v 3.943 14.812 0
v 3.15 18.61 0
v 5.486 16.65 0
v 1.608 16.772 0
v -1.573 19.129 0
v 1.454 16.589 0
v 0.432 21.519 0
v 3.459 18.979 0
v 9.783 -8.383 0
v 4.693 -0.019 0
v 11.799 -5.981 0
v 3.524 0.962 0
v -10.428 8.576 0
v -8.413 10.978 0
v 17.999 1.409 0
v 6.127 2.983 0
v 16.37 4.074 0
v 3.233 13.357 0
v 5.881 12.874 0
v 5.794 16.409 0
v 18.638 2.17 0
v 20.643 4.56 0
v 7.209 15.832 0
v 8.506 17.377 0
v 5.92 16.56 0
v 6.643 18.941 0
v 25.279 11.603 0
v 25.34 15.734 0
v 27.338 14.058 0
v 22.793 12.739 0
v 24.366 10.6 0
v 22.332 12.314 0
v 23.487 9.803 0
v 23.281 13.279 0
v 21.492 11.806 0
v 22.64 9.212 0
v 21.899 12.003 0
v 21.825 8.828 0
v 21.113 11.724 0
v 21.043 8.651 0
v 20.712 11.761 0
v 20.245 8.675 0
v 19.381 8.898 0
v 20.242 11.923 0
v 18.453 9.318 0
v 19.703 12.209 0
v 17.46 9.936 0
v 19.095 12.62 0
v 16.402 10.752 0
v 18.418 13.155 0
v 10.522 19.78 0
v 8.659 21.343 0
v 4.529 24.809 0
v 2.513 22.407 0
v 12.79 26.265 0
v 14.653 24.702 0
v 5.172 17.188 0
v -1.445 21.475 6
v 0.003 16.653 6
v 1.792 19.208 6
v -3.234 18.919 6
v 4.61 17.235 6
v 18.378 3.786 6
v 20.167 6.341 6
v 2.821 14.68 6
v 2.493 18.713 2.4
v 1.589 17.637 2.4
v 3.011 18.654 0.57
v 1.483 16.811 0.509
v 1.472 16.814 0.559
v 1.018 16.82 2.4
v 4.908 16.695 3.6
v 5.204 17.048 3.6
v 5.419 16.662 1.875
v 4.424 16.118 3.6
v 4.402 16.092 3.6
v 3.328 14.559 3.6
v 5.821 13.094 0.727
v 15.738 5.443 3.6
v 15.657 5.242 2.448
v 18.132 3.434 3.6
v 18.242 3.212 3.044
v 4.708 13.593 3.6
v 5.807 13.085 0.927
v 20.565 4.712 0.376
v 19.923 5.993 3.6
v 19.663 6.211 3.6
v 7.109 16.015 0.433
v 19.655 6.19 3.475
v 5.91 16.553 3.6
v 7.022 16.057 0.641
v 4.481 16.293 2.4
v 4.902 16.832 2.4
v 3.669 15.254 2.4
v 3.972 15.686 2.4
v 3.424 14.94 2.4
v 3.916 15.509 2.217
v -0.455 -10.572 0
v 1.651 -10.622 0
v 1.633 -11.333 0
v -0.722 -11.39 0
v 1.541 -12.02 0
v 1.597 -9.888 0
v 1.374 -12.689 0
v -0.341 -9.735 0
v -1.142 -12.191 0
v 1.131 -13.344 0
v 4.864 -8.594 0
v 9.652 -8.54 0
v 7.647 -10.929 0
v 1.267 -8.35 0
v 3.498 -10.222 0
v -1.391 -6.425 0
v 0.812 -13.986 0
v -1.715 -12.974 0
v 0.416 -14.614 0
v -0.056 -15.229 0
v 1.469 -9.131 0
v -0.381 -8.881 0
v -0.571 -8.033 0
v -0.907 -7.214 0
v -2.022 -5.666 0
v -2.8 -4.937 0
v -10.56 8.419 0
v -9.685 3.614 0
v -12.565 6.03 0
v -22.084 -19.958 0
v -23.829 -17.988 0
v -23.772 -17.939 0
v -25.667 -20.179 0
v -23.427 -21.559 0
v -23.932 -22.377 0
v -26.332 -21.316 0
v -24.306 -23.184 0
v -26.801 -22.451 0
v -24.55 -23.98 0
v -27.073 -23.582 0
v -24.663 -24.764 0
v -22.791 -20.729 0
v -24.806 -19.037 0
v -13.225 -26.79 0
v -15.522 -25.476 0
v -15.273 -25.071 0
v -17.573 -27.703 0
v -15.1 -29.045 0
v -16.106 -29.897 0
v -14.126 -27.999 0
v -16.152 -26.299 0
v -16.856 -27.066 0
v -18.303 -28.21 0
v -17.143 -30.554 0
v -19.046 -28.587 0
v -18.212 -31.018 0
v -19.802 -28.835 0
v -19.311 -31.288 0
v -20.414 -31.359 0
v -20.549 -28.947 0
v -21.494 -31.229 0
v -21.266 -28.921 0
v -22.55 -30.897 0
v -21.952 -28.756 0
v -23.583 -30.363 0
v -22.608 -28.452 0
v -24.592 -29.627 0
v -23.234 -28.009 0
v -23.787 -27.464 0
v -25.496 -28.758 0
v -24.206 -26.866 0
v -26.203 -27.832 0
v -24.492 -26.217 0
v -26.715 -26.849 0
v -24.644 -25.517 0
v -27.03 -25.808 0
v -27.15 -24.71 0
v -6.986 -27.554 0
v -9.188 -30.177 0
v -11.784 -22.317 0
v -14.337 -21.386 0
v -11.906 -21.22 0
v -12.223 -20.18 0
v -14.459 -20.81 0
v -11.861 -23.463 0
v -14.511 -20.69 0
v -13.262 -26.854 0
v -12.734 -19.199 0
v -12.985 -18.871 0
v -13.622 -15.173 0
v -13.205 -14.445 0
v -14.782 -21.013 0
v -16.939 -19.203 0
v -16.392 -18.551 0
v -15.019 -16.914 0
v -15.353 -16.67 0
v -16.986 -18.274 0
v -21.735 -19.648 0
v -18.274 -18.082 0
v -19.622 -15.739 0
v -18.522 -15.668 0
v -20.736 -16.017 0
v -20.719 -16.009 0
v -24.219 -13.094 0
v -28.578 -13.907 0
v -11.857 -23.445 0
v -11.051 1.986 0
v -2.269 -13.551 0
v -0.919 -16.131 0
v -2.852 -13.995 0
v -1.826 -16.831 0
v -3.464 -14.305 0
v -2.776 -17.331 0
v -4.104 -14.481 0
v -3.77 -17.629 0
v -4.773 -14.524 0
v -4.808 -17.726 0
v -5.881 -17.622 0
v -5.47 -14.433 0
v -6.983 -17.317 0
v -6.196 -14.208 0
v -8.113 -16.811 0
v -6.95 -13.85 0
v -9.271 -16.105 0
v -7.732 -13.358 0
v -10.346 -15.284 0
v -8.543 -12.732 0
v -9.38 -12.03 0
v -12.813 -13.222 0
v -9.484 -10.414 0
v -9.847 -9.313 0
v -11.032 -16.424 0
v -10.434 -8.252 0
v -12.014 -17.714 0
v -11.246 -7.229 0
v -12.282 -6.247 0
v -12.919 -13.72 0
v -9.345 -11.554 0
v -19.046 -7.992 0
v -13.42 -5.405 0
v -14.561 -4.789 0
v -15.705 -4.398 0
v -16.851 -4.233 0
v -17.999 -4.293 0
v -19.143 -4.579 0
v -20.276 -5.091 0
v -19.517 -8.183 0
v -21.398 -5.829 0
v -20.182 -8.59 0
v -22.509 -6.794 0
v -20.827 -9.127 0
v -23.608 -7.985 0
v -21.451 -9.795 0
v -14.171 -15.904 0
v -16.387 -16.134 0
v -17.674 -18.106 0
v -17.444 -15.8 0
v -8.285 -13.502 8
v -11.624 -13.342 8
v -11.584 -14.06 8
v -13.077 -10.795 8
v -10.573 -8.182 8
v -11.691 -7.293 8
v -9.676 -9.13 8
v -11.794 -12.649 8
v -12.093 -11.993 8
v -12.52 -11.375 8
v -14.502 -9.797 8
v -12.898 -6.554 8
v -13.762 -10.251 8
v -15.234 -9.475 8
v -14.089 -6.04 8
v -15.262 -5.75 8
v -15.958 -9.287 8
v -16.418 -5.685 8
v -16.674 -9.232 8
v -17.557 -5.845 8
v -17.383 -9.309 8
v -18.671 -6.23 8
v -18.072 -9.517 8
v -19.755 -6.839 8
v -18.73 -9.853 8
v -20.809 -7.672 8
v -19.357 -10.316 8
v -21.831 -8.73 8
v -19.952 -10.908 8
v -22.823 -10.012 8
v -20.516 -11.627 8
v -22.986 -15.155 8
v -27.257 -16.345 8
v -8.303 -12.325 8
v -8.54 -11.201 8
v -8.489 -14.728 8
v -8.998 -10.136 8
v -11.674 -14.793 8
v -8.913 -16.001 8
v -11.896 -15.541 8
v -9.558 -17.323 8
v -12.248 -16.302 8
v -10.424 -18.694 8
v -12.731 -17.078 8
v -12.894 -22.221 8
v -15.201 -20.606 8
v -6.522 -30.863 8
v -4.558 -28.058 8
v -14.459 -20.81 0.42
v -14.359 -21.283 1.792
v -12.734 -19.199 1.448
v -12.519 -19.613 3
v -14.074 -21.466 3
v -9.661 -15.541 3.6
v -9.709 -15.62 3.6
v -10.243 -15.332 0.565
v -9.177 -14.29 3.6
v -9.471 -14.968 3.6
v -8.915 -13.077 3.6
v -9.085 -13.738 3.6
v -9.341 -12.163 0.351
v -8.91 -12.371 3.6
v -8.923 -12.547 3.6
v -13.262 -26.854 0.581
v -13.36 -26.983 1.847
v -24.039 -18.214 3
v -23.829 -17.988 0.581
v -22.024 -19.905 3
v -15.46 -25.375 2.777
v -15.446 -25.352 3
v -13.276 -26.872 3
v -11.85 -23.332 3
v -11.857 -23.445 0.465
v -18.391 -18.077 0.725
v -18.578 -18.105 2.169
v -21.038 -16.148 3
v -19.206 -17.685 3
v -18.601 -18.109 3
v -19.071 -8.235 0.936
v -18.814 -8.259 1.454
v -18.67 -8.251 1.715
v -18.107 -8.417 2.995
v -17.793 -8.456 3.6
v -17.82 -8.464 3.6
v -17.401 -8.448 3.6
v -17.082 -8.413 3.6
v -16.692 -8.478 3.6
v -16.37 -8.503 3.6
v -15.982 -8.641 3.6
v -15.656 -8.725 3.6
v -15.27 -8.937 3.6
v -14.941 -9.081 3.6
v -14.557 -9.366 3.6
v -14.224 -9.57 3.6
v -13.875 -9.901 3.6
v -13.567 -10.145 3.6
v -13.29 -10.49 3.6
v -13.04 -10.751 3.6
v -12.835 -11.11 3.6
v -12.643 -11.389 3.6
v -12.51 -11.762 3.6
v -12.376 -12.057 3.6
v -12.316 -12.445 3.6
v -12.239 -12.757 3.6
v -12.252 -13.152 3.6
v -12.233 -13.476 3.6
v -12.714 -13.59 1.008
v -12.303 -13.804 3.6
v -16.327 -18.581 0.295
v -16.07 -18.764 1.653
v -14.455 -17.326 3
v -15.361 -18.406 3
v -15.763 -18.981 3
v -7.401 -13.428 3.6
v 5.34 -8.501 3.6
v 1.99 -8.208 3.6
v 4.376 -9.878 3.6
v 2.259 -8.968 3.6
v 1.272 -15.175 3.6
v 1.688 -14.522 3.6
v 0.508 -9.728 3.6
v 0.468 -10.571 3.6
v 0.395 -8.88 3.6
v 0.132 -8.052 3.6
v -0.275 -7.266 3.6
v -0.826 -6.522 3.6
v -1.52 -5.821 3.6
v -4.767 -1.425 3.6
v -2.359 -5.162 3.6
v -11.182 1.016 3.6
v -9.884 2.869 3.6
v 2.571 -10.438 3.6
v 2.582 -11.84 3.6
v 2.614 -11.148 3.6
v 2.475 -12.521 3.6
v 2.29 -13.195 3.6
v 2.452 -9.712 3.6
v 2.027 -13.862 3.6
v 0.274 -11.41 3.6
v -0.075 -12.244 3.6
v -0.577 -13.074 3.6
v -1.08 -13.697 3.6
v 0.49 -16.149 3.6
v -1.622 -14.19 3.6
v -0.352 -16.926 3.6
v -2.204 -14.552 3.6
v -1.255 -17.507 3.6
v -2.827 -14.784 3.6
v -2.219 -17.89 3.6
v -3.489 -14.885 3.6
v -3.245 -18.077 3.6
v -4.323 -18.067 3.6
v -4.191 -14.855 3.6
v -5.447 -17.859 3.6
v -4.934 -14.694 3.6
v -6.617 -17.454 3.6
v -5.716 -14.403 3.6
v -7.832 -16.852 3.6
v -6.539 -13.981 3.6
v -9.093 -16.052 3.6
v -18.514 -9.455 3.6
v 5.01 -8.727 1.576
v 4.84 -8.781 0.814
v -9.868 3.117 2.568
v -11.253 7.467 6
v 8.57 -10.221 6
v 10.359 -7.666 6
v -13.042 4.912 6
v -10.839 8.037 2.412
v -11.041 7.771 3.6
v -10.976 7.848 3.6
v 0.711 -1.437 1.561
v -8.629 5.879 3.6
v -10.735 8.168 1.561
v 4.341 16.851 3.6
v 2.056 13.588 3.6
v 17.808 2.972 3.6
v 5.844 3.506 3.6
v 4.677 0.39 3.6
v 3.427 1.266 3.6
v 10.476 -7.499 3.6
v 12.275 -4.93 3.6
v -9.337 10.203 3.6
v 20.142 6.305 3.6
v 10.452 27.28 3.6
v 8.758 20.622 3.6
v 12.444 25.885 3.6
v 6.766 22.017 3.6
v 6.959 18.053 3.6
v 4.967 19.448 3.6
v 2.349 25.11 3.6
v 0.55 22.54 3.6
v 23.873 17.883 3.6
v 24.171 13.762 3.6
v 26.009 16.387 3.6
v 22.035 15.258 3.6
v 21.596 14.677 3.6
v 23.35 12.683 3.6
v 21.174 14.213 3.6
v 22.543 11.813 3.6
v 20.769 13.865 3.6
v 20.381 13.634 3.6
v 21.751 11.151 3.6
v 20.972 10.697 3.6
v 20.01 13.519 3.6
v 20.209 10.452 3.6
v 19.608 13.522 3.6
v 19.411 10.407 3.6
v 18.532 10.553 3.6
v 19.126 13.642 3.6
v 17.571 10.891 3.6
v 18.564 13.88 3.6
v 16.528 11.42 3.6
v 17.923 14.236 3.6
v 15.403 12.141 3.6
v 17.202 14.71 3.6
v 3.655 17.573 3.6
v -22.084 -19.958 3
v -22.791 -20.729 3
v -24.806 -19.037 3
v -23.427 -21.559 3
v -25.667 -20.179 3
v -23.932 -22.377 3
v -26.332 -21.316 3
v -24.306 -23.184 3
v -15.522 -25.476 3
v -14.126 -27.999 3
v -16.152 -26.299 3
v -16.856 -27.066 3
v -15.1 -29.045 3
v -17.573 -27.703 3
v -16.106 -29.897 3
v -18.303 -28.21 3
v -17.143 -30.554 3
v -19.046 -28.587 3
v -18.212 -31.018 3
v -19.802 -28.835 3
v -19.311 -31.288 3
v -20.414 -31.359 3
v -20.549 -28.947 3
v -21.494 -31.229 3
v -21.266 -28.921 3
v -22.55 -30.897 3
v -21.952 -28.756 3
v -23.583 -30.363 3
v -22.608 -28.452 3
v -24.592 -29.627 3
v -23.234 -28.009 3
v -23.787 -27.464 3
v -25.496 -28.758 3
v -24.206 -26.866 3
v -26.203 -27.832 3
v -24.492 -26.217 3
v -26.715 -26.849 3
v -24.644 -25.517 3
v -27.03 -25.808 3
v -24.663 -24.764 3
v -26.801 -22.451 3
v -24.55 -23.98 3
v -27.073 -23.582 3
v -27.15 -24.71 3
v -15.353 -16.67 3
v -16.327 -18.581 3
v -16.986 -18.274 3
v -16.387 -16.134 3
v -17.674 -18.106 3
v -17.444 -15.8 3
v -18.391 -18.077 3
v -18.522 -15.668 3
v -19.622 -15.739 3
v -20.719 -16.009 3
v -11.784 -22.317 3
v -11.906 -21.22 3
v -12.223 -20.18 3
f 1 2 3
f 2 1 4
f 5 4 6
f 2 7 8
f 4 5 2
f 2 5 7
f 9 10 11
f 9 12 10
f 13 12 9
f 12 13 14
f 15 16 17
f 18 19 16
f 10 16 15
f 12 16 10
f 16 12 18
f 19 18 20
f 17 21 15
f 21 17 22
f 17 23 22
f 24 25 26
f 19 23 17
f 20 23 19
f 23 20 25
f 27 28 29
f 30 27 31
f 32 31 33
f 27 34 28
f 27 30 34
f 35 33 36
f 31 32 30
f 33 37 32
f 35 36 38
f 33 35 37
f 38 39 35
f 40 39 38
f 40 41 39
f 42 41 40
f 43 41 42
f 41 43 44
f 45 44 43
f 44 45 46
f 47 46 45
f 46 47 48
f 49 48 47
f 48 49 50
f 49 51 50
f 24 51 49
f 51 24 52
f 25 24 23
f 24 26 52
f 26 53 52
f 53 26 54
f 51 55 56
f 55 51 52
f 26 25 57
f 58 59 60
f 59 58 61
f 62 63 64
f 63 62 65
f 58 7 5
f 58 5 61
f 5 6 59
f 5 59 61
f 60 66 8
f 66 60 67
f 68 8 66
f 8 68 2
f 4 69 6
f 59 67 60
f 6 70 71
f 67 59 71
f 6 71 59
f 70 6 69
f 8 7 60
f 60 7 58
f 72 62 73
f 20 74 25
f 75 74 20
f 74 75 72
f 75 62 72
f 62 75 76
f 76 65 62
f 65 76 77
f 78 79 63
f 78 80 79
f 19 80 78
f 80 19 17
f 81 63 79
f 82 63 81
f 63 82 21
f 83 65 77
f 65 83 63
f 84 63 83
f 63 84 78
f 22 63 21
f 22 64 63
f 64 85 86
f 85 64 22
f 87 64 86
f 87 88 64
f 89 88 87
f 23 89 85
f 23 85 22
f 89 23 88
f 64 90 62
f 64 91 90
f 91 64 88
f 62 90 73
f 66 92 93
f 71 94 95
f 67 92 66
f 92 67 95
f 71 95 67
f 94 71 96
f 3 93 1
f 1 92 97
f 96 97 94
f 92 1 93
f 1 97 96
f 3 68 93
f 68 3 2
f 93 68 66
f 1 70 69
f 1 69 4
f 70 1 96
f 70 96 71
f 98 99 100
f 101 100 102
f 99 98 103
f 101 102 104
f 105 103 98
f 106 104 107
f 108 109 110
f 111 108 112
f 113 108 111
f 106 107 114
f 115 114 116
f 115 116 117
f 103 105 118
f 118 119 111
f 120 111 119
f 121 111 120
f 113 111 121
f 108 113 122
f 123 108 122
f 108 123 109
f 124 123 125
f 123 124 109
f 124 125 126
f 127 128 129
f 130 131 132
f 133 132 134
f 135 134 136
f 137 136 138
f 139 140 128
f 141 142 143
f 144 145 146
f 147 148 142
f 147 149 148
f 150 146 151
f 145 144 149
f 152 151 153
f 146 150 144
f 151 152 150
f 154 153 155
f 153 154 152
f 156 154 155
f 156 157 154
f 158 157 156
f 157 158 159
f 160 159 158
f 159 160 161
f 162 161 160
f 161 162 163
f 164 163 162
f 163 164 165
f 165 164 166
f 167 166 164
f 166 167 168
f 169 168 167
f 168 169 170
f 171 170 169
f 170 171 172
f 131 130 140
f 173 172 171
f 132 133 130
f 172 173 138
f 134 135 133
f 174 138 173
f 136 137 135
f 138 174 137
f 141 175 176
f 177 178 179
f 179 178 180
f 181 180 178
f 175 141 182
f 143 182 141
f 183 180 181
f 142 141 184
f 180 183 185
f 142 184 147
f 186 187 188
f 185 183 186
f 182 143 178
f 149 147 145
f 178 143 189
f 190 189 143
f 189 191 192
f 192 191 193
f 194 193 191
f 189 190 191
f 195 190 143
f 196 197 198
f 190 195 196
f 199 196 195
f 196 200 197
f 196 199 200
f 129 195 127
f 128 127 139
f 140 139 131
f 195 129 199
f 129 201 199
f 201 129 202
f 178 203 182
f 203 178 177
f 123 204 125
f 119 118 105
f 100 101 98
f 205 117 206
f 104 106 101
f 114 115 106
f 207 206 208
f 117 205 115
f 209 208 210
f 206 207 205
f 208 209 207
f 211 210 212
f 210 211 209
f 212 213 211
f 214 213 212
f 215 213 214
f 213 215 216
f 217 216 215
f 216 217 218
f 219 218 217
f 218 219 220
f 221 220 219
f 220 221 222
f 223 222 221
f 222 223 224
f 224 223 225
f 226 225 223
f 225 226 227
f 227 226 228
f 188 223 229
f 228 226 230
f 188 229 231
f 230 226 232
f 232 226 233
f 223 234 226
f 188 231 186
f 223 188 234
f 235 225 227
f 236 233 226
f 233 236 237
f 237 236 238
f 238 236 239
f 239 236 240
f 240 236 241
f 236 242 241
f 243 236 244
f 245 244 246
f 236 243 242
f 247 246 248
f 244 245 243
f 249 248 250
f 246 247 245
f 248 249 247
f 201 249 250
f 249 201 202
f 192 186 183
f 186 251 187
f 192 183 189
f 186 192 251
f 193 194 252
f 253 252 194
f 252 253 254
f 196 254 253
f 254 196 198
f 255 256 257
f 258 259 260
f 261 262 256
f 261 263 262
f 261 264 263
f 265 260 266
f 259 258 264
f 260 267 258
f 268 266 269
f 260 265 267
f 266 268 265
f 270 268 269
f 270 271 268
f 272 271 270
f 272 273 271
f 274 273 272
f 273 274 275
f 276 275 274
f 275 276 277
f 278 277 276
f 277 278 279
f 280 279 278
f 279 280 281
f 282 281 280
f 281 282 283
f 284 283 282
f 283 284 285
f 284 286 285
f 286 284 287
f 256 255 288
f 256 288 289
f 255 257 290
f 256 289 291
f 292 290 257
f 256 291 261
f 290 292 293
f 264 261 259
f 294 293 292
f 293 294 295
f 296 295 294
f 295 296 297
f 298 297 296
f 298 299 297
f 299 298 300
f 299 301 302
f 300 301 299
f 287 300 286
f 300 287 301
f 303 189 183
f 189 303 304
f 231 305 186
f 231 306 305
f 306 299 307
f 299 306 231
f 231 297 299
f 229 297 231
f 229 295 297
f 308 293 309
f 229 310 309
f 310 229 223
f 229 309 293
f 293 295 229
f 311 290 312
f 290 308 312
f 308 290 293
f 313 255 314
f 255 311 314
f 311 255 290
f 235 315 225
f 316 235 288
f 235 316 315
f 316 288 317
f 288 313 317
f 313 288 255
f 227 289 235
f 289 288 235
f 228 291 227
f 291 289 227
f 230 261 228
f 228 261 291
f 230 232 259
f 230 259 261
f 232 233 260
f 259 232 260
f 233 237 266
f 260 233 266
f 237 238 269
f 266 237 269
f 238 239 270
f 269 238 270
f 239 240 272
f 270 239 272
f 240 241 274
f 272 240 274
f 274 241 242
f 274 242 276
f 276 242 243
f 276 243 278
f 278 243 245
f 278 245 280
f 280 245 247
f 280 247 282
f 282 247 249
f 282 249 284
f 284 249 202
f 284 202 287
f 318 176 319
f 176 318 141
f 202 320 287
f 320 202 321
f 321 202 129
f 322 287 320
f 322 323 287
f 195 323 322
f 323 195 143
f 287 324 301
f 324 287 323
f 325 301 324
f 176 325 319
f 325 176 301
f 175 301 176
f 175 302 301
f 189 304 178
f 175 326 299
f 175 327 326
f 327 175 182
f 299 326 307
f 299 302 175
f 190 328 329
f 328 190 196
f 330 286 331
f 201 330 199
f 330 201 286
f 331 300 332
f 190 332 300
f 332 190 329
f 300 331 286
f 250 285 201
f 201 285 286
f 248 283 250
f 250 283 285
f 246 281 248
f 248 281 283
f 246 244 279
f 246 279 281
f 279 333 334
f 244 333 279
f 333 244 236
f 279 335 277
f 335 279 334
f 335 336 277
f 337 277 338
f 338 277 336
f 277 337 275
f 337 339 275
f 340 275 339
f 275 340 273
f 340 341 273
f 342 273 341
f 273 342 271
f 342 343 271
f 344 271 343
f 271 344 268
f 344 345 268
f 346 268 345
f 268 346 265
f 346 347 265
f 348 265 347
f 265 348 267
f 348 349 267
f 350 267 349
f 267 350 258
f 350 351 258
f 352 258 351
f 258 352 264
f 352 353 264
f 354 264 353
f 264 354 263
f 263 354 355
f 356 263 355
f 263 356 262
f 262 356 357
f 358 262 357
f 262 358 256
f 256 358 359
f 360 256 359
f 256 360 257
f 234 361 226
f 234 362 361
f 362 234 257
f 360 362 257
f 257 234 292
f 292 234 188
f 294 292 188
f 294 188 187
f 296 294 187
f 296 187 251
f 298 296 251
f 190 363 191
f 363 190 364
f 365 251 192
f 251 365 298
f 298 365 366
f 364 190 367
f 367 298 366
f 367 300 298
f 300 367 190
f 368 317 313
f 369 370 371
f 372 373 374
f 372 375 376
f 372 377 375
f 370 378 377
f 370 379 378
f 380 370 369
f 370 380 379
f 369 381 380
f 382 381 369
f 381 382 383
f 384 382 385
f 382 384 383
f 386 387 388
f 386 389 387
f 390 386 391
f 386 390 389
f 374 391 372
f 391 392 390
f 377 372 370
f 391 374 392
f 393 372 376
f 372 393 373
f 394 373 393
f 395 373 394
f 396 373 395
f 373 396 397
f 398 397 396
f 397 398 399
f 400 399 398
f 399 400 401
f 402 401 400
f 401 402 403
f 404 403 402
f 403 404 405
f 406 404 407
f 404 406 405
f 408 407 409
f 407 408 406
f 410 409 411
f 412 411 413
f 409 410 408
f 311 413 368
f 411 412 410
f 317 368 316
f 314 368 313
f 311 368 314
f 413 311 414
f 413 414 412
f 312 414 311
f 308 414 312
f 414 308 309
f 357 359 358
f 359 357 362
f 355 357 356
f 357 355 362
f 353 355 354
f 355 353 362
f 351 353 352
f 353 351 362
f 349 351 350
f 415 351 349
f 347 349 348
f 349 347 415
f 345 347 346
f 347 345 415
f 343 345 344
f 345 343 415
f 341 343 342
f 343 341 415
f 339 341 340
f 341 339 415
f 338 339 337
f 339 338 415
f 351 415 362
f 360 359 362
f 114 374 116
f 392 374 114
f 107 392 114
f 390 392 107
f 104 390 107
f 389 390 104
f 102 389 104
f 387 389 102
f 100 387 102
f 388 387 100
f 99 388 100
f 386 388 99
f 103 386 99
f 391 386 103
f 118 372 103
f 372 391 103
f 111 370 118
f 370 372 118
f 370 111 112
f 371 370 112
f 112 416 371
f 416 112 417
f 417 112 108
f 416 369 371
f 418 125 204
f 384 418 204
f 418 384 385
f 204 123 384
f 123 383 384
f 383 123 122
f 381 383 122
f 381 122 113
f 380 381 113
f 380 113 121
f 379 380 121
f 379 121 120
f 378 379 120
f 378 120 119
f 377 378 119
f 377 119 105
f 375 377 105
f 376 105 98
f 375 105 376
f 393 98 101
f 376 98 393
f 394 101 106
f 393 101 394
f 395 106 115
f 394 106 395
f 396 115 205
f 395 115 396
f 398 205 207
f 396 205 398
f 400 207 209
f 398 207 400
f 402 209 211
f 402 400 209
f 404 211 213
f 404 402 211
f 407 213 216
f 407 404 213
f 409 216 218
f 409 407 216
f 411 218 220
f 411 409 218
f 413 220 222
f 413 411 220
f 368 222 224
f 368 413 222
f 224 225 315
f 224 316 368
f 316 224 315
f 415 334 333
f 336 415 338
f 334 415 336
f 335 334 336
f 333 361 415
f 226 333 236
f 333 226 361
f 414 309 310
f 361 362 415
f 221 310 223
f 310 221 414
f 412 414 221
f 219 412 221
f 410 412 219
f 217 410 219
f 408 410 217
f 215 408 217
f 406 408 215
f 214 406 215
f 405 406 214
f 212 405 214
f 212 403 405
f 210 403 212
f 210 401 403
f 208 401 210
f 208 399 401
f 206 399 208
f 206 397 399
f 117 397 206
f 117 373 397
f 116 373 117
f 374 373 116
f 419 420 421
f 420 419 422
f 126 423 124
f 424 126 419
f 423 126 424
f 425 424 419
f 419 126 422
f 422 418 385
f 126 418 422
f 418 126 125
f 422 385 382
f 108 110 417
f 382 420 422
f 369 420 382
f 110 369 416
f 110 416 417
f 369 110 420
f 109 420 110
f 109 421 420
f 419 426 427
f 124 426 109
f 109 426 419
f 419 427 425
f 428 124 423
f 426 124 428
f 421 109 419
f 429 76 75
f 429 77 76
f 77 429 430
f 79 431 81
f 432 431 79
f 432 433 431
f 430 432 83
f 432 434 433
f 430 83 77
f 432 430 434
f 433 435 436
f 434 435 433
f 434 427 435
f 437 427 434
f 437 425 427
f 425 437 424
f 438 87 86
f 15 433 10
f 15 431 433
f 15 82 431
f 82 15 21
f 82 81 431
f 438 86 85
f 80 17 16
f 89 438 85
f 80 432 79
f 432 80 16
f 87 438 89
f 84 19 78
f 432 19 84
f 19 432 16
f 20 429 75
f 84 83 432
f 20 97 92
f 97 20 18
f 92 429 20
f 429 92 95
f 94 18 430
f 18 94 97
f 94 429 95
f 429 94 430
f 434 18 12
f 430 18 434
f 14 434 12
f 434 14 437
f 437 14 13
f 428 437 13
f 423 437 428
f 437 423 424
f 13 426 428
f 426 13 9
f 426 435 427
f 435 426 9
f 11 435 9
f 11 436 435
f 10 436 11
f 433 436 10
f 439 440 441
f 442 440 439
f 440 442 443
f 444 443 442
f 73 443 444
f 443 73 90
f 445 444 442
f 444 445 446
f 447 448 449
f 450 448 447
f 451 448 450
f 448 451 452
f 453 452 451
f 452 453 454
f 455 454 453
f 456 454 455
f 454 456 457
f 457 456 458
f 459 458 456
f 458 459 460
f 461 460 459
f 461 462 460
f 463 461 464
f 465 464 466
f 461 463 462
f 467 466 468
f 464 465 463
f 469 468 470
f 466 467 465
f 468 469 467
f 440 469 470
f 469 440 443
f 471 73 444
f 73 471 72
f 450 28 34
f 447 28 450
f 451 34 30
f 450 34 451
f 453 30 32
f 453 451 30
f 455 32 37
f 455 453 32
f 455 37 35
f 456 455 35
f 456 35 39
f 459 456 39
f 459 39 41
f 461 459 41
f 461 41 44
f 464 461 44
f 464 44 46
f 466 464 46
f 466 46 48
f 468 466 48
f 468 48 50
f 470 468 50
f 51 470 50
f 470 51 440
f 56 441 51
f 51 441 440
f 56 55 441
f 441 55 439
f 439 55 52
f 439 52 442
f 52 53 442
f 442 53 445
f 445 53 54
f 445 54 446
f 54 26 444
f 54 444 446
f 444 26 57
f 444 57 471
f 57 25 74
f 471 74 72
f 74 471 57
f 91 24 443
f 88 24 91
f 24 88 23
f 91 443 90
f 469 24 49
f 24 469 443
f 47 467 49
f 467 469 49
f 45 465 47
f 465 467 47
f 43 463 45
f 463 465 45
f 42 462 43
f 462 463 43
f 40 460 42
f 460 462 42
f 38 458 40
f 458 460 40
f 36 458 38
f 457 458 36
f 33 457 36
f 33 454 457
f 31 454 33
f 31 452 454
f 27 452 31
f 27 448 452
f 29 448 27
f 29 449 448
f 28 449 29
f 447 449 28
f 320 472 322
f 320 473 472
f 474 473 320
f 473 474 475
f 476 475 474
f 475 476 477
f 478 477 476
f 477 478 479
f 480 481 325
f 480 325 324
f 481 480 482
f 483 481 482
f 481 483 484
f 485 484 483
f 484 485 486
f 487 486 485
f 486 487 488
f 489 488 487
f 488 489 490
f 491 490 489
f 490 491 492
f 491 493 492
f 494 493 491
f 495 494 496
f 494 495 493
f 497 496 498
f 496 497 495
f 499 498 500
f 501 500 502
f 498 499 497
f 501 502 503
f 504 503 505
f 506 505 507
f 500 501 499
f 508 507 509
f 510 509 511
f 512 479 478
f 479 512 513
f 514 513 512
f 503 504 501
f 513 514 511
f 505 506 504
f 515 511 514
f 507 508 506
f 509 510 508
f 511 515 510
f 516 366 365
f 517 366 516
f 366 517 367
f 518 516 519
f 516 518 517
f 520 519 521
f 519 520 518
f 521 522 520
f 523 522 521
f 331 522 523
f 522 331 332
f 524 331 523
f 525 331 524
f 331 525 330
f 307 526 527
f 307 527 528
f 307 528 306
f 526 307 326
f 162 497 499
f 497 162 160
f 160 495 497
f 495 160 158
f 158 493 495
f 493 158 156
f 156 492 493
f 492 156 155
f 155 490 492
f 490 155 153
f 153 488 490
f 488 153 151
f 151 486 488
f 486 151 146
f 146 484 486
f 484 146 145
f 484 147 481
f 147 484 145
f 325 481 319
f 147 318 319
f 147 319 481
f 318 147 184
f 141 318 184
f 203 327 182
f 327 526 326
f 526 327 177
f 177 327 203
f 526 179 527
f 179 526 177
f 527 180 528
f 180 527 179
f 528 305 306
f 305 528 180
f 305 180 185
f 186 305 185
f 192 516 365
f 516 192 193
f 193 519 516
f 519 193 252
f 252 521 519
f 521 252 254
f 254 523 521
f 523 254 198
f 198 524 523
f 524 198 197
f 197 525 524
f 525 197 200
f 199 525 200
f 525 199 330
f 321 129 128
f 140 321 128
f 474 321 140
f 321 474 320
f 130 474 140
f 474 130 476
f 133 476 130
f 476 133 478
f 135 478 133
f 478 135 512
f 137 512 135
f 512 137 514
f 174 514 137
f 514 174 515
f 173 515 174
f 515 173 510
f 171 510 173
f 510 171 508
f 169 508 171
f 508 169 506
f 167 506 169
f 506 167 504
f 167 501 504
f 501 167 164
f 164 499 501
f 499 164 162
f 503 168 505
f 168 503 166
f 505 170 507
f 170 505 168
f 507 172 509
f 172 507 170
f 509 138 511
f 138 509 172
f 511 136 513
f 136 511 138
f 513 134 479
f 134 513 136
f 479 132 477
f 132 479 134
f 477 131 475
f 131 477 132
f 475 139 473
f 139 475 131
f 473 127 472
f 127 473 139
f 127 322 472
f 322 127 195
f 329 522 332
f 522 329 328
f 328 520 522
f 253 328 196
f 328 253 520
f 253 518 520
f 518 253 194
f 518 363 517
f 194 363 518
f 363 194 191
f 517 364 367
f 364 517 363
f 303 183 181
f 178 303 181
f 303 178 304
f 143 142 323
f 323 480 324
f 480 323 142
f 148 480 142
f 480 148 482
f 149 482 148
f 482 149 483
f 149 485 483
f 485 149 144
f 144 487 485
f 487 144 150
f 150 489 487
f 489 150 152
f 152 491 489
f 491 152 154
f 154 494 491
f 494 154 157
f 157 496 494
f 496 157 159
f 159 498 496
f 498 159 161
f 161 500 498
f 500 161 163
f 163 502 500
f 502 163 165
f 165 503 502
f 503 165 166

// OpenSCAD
Font_name = "Chewy";
Text = "Pulkit";
Rotation = 50;
Connect_dots = true;
Dot_bridge_height_percent = 40;

function char_w(c) = 
    (c == "m" || c == "w") ? 15.0 :
    (c == "i" || c == "l" || c == "j" || c == "t" || c == "f") ? 7.5 :
    (c >= "A" && c <= "Z") ? 14.0 :
    10.5;

function get_step_at(text, i) = 
    (i <= 0) ? 0 :
    ((char_w(text[i-1]) + char_w(text[i])) / 2 * 0.95);

function get_char_x_auto(text, i) = 
    (i <= 0) ? 0 : (get_char_x_auto(text, i - 1) + get_step_at(text, i));

span = get_char_x_auto(Text, len(Text)-1);
cx = span / 2;
loop_x = -cx - 8.5;
loop_y = 0;
twist = -5;
$fn = 32;

rotate([0, 0, Rotation]) {
    union() {
        // Loop
        color("DimGray")
        linear_extrude(height = 3, $fn = $fn)
            translate([loop_x, loop_y, 0]) rotate([0, 0, -90])
                text(size = 20, text = "o", font = Font_name, halign = "center", valign = "center", $fn = $fn);

        // Letters
        for (i = [0 : len(Text) - 1]) {
            h = (i == 0) ? 8.0 : ((i % 2 == 0) ? 6.0 : 3.6);
            char = Text[i];
            char_x = get_char_x_auto(Text, i) - cx;

            color([0.92, 0.72, 0.1]) {
                // Main letter extrusion (full height h)
                linear_extrude(height = h, twist = twist, $fn = $fn)
                    translate([char_x, 0, 0])
                        text(size = 25, text = char, font = Font_name, halign = "center", valign = "center", $fn = $fn);

                // Recessed bridge at 40% height (retains strength, preserves top surface aesthetics)
                if (Connect_dots) {
                    bridge_factor = Dot_bridge_height_percent / 100;
                    bridge_h = h * bridge_factor;
                    bridge_twist = twist * bridge_factor;
                    if (char == "i") {
                        linear_extrude(height = bridge_h, twist = bridge_twist, $fn = $fn)
                            translate([char_x, 0, 0])
                                translate([-1.2, 6.5]) square([2.4, 4.0]);
                    }
                    if (char == "j") {
                        linear_extrude(height = bridge_h, twist = bridge_twist, $fn = $fn)
                            translate([char_x, 0, 0])
                                translate([-1.2, 11.0]) square([2.4, 4.0]);
                    }
                }
            }
        }
    }
}
